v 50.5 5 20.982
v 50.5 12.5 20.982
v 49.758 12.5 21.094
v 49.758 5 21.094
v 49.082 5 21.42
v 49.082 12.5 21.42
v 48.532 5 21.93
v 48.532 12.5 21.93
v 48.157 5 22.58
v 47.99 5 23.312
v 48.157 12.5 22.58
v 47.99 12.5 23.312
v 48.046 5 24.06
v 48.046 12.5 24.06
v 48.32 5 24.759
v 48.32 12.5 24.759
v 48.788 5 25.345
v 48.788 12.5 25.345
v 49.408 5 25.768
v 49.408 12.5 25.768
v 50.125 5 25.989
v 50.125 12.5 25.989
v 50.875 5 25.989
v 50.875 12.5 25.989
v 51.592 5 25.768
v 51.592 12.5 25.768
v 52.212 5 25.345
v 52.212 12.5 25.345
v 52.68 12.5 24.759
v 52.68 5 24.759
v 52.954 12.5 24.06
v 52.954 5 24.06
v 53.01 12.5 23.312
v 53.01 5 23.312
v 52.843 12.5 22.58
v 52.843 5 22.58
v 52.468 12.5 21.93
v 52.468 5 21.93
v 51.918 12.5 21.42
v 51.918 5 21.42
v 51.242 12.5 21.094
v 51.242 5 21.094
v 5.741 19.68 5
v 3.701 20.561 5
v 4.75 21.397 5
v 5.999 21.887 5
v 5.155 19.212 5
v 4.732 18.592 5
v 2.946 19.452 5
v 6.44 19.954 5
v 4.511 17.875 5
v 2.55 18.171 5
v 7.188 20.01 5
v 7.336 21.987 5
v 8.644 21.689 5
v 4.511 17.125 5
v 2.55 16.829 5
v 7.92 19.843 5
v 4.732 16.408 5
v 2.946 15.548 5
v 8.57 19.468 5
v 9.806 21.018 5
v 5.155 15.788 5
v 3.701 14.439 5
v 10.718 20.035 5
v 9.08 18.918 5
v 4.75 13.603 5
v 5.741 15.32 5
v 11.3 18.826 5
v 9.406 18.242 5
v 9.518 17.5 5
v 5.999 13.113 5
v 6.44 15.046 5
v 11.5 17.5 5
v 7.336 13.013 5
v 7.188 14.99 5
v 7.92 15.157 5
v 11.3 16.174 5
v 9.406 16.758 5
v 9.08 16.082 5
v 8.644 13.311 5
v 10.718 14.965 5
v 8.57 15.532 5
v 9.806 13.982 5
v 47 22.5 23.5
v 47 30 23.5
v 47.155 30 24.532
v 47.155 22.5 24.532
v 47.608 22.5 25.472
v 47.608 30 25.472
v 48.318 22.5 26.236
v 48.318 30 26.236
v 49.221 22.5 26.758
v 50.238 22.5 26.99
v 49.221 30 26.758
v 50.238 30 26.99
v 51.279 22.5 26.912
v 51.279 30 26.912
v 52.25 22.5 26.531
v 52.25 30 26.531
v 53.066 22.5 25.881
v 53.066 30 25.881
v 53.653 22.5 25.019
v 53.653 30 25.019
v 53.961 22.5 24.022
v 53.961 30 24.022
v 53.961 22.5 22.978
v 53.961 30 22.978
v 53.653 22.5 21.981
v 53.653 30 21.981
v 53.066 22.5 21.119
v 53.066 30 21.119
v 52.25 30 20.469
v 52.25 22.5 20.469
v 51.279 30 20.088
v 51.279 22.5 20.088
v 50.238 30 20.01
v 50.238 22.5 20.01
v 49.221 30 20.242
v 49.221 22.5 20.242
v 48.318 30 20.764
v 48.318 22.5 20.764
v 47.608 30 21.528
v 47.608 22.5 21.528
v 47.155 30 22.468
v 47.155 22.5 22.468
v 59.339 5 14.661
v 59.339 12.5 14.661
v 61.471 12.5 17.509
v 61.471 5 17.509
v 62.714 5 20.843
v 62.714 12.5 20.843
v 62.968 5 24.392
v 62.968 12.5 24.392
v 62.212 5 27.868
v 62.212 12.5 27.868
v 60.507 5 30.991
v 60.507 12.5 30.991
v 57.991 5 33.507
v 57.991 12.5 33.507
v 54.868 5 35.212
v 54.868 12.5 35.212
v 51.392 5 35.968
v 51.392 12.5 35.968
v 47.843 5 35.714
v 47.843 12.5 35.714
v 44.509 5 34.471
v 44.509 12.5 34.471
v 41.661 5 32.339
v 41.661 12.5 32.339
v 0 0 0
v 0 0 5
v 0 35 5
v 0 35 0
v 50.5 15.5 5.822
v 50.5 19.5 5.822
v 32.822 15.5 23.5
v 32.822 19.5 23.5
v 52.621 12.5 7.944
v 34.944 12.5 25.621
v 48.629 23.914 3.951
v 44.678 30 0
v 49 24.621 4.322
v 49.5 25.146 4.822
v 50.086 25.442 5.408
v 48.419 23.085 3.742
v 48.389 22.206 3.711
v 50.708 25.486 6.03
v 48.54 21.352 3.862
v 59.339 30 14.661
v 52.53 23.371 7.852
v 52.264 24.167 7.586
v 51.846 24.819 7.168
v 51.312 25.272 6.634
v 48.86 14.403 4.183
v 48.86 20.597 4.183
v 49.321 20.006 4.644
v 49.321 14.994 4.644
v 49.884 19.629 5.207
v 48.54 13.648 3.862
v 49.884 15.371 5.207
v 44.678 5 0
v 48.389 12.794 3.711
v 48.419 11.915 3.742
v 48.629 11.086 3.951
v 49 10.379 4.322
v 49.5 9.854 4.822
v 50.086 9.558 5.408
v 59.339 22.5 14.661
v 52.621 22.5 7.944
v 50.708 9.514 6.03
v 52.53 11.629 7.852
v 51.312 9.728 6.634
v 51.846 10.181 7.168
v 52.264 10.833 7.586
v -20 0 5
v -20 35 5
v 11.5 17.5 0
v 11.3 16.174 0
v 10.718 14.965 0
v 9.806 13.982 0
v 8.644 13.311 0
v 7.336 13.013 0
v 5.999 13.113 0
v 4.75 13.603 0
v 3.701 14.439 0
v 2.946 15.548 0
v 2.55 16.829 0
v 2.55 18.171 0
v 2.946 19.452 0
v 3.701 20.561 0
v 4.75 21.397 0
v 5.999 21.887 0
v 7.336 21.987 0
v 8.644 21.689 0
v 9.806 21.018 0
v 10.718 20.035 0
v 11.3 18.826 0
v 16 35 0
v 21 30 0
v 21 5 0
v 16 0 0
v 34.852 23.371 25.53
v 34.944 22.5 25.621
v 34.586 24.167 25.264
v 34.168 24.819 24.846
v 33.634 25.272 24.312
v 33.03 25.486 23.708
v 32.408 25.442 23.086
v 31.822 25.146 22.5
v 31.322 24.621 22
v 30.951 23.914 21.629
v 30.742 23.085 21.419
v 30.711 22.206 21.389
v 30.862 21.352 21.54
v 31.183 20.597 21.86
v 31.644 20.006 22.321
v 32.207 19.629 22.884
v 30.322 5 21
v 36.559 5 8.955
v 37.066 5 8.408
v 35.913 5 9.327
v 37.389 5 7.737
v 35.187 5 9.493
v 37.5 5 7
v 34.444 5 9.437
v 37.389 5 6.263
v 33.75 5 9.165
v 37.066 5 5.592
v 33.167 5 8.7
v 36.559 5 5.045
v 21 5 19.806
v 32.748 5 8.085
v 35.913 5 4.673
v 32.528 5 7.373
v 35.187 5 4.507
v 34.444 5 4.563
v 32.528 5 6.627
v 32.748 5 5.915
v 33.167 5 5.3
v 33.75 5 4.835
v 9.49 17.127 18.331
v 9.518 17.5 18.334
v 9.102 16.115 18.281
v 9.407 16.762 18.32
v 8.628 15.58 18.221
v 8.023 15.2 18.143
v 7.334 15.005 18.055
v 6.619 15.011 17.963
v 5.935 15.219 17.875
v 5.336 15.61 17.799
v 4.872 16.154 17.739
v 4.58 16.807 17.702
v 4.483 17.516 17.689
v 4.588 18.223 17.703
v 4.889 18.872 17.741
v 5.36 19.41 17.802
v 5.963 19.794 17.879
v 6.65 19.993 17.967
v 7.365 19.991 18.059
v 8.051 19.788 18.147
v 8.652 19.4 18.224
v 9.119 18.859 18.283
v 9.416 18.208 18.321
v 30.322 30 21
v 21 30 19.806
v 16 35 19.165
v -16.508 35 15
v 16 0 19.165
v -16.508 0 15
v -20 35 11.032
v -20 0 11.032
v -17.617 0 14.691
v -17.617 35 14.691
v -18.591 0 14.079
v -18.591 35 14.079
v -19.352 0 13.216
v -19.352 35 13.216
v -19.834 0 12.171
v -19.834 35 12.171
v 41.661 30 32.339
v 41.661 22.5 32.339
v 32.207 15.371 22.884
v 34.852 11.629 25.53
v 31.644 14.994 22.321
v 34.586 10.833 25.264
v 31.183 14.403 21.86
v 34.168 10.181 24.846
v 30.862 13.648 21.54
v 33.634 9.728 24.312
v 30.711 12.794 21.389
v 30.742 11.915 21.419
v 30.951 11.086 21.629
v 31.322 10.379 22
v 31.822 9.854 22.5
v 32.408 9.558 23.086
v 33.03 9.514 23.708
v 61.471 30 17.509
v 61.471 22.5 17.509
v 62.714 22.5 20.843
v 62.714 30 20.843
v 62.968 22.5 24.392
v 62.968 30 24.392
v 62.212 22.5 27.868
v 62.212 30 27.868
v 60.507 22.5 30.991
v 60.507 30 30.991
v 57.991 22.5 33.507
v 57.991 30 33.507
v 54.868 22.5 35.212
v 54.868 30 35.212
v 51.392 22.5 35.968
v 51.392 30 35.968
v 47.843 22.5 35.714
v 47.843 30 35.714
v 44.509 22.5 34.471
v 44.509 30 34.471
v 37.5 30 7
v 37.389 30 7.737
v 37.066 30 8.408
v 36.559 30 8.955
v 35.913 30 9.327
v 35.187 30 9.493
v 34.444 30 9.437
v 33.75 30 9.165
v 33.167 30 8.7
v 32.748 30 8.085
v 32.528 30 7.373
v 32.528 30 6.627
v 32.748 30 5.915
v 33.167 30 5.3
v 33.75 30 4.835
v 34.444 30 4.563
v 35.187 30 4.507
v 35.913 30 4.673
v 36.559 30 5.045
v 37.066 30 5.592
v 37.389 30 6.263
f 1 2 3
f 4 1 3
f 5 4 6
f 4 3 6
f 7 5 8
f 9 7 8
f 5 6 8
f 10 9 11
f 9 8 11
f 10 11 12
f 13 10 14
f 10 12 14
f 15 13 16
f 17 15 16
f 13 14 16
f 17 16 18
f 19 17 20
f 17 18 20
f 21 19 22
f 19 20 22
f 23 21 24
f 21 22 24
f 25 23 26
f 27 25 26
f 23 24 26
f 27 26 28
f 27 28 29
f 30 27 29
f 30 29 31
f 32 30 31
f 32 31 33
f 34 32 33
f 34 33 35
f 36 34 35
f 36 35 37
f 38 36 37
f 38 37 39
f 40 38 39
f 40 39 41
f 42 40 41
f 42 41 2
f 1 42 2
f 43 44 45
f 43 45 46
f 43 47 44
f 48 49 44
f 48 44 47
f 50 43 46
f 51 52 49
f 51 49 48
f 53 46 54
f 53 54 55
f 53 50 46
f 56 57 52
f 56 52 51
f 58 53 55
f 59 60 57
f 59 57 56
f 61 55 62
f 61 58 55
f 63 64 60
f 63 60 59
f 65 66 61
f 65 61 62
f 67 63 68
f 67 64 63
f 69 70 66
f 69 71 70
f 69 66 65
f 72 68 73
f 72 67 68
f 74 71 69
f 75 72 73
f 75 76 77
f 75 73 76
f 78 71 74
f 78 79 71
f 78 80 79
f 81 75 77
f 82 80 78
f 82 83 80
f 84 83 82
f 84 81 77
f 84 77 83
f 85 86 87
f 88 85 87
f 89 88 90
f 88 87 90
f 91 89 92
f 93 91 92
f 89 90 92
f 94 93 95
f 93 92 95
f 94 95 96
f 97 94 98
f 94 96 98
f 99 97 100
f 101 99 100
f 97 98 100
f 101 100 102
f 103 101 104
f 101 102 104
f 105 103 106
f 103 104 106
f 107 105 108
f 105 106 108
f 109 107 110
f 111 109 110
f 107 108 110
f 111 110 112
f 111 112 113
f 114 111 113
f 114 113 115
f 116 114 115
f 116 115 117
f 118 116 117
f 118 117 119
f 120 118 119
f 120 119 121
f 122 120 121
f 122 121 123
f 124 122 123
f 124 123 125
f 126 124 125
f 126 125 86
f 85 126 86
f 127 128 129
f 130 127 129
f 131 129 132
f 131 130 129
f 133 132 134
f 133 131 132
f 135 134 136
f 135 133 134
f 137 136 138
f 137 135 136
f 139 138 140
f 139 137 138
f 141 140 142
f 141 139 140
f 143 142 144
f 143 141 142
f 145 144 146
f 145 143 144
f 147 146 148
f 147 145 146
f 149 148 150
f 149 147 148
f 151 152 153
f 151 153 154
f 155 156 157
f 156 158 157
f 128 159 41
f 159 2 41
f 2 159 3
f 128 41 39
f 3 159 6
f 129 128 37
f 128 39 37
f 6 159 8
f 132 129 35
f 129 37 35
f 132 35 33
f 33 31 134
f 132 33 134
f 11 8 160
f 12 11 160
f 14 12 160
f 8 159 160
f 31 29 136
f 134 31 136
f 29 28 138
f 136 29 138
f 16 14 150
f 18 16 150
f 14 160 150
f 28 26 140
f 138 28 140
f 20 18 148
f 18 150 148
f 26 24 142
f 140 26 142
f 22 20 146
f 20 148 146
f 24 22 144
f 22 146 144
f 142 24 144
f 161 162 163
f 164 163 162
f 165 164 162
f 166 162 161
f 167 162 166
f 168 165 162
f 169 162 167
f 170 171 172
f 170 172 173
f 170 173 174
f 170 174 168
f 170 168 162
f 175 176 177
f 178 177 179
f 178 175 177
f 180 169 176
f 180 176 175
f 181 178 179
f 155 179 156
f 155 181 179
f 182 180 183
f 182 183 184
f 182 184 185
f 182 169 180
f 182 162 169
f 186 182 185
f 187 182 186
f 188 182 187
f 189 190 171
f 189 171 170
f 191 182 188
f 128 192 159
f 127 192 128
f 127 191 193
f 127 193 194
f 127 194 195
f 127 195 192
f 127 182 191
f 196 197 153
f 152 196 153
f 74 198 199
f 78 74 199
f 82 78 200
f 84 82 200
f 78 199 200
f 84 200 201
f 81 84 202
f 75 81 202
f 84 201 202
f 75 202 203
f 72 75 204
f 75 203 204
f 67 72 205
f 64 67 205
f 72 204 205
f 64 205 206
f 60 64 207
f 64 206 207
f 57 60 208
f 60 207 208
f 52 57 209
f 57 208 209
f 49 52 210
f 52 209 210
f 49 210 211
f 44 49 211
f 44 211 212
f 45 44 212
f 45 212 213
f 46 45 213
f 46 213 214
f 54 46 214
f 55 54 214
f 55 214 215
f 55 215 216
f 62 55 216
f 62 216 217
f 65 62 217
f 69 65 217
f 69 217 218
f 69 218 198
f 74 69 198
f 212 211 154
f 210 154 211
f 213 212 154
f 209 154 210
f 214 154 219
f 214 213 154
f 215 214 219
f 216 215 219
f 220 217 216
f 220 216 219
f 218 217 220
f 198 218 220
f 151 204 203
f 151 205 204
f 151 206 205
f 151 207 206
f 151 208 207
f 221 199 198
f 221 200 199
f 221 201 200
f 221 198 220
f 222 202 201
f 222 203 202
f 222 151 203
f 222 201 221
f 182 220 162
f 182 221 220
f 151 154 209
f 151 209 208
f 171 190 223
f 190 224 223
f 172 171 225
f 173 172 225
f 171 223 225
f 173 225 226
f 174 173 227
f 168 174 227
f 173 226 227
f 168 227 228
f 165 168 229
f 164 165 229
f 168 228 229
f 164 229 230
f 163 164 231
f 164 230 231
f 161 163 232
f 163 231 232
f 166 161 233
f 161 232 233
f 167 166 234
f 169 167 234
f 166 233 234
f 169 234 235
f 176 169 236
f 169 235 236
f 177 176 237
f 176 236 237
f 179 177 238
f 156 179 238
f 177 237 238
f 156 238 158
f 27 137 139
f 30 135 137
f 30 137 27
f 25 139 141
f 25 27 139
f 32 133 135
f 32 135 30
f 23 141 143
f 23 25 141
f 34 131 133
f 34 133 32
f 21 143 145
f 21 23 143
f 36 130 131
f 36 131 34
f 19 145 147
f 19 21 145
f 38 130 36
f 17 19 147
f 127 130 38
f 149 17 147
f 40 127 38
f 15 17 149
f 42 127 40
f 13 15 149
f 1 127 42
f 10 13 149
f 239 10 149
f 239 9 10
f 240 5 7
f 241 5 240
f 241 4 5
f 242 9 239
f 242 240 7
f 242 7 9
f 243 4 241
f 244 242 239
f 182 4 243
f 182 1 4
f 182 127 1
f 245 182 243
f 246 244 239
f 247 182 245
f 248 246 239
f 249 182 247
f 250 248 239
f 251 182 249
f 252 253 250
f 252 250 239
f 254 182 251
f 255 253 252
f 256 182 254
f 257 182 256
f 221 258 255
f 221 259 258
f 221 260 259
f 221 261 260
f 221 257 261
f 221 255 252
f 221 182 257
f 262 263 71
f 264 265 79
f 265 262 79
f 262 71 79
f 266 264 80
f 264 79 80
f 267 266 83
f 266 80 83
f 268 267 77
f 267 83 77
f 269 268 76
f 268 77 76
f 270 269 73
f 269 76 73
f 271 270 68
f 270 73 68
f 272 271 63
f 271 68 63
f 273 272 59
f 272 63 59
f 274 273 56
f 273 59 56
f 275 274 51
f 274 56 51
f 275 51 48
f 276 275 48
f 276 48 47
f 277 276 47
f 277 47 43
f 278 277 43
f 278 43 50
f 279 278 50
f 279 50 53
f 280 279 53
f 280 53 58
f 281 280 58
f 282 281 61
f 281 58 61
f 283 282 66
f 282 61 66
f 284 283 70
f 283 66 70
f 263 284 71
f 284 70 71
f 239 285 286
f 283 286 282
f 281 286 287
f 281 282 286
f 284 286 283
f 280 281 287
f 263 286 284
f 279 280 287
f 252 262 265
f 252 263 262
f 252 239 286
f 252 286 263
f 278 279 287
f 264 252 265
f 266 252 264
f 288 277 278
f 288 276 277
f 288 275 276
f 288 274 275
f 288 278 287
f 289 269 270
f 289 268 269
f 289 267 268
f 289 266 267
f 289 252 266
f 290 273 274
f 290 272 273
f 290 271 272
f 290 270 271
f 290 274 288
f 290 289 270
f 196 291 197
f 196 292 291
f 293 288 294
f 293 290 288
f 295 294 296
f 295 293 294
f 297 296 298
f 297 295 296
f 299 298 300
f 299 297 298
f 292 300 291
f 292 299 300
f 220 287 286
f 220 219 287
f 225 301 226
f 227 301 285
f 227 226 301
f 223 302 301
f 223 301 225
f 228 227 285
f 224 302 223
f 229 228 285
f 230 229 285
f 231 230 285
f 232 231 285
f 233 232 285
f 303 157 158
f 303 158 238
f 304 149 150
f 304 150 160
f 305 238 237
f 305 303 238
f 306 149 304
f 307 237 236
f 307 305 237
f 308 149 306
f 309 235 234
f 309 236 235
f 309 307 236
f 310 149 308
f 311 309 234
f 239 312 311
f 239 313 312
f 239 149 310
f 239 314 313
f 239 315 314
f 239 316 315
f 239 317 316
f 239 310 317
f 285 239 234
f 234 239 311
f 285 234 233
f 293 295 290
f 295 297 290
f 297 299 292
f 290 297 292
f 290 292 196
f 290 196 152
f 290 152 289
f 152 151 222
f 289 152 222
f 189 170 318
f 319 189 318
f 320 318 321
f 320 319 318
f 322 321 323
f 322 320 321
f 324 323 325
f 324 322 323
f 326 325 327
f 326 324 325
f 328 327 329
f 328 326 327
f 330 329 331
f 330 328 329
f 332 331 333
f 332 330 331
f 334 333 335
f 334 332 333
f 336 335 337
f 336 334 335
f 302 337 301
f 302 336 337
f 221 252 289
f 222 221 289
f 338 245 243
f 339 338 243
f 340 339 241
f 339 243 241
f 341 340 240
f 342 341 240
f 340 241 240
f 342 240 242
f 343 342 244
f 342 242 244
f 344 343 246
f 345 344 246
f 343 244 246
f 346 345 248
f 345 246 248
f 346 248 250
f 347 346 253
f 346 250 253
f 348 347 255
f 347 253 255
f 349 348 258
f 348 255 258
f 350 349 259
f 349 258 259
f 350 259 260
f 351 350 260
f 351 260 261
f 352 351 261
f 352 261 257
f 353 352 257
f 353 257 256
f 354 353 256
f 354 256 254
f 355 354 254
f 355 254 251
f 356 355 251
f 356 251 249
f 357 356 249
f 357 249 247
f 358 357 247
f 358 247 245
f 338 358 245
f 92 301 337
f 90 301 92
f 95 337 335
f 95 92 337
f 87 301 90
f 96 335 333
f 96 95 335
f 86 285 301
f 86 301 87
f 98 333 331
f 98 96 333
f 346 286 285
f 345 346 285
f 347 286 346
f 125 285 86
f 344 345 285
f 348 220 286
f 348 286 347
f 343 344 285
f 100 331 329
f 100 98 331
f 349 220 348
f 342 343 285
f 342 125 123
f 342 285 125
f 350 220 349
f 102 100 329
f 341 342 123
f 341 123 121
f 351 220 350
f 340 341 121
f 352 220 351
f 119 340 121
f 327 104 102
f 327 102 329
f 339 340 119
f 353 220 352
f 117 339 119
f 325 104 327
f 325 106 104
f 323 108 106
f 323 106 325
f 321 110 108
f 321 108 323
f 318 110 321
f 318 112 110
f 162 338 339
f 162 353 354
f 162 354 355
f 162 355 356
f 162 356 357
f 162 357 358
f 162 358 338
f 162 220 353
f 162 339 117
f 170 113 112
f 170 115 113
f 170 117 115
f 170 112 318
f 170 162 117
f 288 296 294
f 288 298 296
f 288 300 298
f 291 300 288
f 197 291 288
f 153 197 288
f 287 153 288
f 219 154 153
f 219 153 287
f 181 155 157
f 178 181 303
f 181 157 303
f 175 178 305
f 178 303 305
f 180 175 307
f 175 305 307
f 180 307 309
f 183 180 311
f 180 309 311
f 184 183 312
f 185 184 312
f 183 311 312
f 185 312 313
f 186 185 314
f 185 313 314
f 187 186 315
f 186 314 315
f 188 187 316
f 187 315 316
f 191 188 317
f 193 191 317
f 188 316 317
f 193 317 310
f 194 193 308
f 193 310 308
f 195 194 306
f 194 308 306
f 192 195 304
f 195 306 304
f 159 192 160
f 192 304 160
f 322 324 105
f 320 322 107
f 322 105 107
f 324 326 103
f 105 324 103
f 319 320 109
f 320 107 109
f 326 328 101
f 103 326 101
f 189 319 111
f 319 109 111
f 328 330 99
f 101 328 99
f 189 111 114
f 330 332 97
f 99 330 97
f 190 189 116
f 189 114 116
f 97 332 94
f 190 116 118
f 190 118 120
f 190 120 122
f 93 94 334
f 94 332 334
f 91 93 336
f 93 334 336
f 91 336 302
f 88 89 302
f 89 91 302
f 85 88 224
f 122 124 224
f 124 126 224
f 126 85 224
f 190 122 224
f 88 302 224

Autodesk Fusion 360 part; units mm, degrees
sketch "草图1" plane through (0, 0, 0) normal (0, 1, 0) x (1, 0, 0)
  line L0 (0, 0) -> (44.67767, 0)
  line L1 (44.67767, 0) -> (59.338835, -14.661165)
  arc A0 (41.661165, -32.338835) -> (59.338835, -14.661165) centre (50.5, -23.5) ccw
  line L2 (41.661165, -32.338835) -> (30.32233, -21)
  line L3 (30.32233, -21) -> (-16.50833, -15)
  arc A1 (-20, -11.032431) -> (-16.50833, -15) centre (-16, -11.032431) ccw
  line L4 (-20, -11.032431) -> (-20, -5)
  line L5 (-20, -5) -> (0, -5)
  line L6 (0, -5) -> (0, 0)
  circle A2 centre (35, -7) radius 2.5
  dimension "d1" = 5
  dimension "d2" = 20
  dimension "d3" = 4
  dimension "d4" = 135
  dimension "d5" = 35
  dimension "d6" = 12.5
  dimension "d7" = 23.5
  dimension "d8" = 70.5
  dimension "d9" = 5
  dimension "d10" = 7
  dimension "d11" = 21
  dimension "d12" = 10
extrude "拉伸1" add sketch "草图1" along normal blind 35 contours L0 L1 A0 L2 L3 A1 L4 L5 L6 picked at (45.852908, -18.651526)
sketch "草图2" plane through (0, 0, 0) normal (0, 0, 1) x (1, 0, 0)
  line L0 (-20, 0) -> (-20, 35)
  line L1 (-20, 35) -> (16, 35)
  line L2 (16, 35) -> (21, 30)
  line L3 (21, 30) -> (105, 30)
  line L4 (105, 30) -> (105, 5)
  line L5 (105, 5) -> (21, 5)
  line L6 (21, 5) -> (16, 0)
  line L7 (16, 0) -> (-20, 0)
  line L8 (-55, 0) -> (65, 0) construction
  line L9 (-20, 17.5) -> (-60, 17.5) construction
  dimension "d15" = 20
  dimension "d16" = 35
  dimension "d17" = 36
  dimension "d18" = 135
  dimension "d19" = 135
  dimension "d20" = 25
  dimension "d21" = 125
extrude "拉伸2" cut sketch "草图2" along normal blind 85 contours L0 L1 L2 L3 L4 L5 L6 L7 picked at (77, 21.666667) keep common part
sketch "草图3" plane through (4.661165, 0, -4.661165) normal (-0.707107, 0, 0.707107) x (0, -1, 0)
  line L0 (-30, 52.325902) -> (-30, 36.290368)
  line L1 (-30, 36.290368) -> (-5, 36.290368)
  line L2 (-5, 36.290368) -> (-5, 52.325902)
  line L3 (-5, 52.325902) -> (-30, 52.325902)
  line L4 (-17.5, 36.290368) -> (-17.5, 72.000001) construction
  line L5 (-19.5, 39.825902) -> (-15.5, 39.825902)
  line L6 (-12.5, 39.825902) -> (-12.5, 64.825902)
  line L7 (-12.5, 64.825902) -> (-22.5, 64.825902)
  line L8 (-22.5, 64.825902) -> (-22.5, 42.825902)
  arc A0 (-15.5, 39.825902) -> (-12.5, 42.825902) centre (-12.5, 39.825902) ccw
  arc A1 (-22.5, 42.825902) -> (-19.5, 39.825902) centre (-22.5, 39.825902) ccw
  dimension "d24" = 6
  dimension "d25" = 10
  dimension "d26" = 12.5
  dimension "d27" = 25
extrude "拉伸3" cut sketch "草图3" against normal blind 61 contours L3 L6 L7 L8 | L3 L5 L6 L8 A0 A1 picked at (-15.833333, 56.492568) picked at (-19.166667, 49.159235)
sketch "草图4" plane through (0, 30, 0) normal (0, 1, 0) x (-1, 0, 0)
  line L0 (-21, 19.805612) -> (-30.32233, 21)
  line L1 (-30.32233, 21) -> (-41.661165, 32.338835)
  arc A0 (-41.661165, 32.338835) -> (-59.338835, 14.661165) centre (-50.5, 23.5) ccw
  line L2 (-59.338835, 14.661165) -> (-44.67767, 0)
  line L3 (-44.67767, 0) -> (-21, 0)
  line L4 (-21, 0) -> (-21, 19.805612)
  circle A1 centre (-35, 7) radius 2.5
  circle A2 centre (-50.5, 23.5) radius 3.5
  dimension "d30" = 7
extrude "拉伸4" cut sketch "草图4" against normal blind 15 contours A2 picked at (-51.083333, 24.076707)
sketch "草图5" plane through (0, 5, 0) normal (0, -1, 0) x (1, 0, 0)
  line L0 (30.32233, 21) -> (21, 19.805612)
  line L1 (21, 19.805612) -> (21, 0)
  line L2 (21, 0) -> (44.67767, 0)
  line L3 (44.67767, 0) -> (59.338835, 14.661165)
  arc A0 (59.338835, 14.661165) -> (41.661165, 32.338835) centre (50.5, 23.5) ccw
  line L4 (41.661165, 32.338835) -> (30.32233, 21)
  circle A1 centre (35, 7) radius 2.5
hole "孔1" at (50.5, 5, 23.5) direction (0, 1, 0) diameter 6 depth 13 tip angle 180
thread "螺纹1" "ISO Metric profile 6.0 M6x1 M6x1 6H" major diameter 6.147 minor diameter 5.035 pitch 1 angle 60 resizes the face on face at (50.798704, 7.5, 26.485092)
sketch "草图6" plane through (0, 0, 0) normal (0, 0, -1) x (1, 0, 0)
  line L0 (16, -35) -> (21, -30)
  line L1 (21, -30) -> (44.67767, -30)
  line L2 (44.67767, -30) -> (44.67767, -5)
  line L3 (44.67767, -5) -> (21, -5)
  line L4 (21, -5) -> (16, 0)
  line L5 (16, 0) -> (0, 0)
  line L6 (0, 0) -> (0, -35)
  line L7 (0, -35) -> (16, -35)
  circle A0 centre (7, -17.5) radius 4.5
  dimension "d38" = 7
  dimension "d39" = 9
  dimension "d40" = 17.5
extrude "拉伸5" cut sketch "草图6" against normal blind 5 contours A0 picked at (6.233246, -18.575475)
sketch "草图7" plane through (0, 0, 5) normal (0, 0, -1) x (1, 0, 0)
  circle A0 centre (7, -17.5) radius 4.5
  circle A1 centre (7, -17.5) radius 3
  dimension "d43" = 6
extrude "拉伸6" cut sketch "草图7" against normal blind 92 contours A1 picked at (5.87651, -18.041044)
thread "螺纹2" "ISO Metric profile 6.0 M6x1 M6x1 6H" major diameter 6.147 minor diameter 5.035 pitch 1 angle 60 resizes the face on face at (9.991104, 17.269137, 9.465001)
equation "d26 = 25 mm - 12.5 mm"
